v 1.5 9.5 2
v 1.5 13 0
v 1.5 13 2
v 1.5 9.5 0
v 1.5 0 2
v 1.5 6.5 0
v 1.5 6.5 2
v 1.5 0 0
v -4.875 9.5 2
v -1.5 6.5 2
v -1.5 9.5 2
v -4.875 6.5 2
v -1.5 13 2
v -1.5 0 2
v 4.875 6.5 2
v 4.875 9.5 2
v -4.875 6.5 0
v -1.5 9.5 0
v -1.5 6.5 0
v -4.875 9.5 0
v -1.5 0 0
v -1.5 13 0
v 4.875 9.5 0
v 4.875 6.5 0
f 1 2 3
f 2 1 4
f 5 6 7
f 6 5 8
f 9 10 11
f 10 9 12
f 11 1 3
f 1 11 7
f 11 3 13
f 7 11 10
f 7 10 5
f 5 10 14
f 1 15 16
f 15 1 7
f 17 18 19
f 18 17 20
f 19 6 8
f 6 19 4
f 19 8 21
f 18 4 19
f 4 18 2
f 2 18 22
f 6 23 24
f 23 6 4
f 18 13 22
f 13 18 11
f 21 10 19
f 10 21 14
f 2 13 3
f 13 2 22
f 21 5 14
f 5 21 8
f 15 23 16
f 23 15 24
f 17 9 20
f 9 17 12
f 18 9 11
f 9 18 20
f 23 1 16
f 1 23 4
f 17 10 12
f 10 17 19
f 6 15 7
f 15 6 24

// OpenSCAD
crucifixionCcross();

module crucifixionCcross(height=2)
{
    beamWidth = 3;
    
    union()
    {
        // vertical beam
        xTranslate = -beamWidth / 2.0;
        yLength = 13;
        color("brown")
        translate([xTranslate, 0, 0])
        cube([3, yLength, height]);

        // horizontal beam        
        yTranslate = yLength * 0.5;
        xLength = yLength * 0.75;
        xTranslateHBeam = -xLength / 2.0;
        
        color("green")
        translate([xTranslateHBeam, yTranslate, 0])
        cube([xLength, 3, height]);        
    }        
}
